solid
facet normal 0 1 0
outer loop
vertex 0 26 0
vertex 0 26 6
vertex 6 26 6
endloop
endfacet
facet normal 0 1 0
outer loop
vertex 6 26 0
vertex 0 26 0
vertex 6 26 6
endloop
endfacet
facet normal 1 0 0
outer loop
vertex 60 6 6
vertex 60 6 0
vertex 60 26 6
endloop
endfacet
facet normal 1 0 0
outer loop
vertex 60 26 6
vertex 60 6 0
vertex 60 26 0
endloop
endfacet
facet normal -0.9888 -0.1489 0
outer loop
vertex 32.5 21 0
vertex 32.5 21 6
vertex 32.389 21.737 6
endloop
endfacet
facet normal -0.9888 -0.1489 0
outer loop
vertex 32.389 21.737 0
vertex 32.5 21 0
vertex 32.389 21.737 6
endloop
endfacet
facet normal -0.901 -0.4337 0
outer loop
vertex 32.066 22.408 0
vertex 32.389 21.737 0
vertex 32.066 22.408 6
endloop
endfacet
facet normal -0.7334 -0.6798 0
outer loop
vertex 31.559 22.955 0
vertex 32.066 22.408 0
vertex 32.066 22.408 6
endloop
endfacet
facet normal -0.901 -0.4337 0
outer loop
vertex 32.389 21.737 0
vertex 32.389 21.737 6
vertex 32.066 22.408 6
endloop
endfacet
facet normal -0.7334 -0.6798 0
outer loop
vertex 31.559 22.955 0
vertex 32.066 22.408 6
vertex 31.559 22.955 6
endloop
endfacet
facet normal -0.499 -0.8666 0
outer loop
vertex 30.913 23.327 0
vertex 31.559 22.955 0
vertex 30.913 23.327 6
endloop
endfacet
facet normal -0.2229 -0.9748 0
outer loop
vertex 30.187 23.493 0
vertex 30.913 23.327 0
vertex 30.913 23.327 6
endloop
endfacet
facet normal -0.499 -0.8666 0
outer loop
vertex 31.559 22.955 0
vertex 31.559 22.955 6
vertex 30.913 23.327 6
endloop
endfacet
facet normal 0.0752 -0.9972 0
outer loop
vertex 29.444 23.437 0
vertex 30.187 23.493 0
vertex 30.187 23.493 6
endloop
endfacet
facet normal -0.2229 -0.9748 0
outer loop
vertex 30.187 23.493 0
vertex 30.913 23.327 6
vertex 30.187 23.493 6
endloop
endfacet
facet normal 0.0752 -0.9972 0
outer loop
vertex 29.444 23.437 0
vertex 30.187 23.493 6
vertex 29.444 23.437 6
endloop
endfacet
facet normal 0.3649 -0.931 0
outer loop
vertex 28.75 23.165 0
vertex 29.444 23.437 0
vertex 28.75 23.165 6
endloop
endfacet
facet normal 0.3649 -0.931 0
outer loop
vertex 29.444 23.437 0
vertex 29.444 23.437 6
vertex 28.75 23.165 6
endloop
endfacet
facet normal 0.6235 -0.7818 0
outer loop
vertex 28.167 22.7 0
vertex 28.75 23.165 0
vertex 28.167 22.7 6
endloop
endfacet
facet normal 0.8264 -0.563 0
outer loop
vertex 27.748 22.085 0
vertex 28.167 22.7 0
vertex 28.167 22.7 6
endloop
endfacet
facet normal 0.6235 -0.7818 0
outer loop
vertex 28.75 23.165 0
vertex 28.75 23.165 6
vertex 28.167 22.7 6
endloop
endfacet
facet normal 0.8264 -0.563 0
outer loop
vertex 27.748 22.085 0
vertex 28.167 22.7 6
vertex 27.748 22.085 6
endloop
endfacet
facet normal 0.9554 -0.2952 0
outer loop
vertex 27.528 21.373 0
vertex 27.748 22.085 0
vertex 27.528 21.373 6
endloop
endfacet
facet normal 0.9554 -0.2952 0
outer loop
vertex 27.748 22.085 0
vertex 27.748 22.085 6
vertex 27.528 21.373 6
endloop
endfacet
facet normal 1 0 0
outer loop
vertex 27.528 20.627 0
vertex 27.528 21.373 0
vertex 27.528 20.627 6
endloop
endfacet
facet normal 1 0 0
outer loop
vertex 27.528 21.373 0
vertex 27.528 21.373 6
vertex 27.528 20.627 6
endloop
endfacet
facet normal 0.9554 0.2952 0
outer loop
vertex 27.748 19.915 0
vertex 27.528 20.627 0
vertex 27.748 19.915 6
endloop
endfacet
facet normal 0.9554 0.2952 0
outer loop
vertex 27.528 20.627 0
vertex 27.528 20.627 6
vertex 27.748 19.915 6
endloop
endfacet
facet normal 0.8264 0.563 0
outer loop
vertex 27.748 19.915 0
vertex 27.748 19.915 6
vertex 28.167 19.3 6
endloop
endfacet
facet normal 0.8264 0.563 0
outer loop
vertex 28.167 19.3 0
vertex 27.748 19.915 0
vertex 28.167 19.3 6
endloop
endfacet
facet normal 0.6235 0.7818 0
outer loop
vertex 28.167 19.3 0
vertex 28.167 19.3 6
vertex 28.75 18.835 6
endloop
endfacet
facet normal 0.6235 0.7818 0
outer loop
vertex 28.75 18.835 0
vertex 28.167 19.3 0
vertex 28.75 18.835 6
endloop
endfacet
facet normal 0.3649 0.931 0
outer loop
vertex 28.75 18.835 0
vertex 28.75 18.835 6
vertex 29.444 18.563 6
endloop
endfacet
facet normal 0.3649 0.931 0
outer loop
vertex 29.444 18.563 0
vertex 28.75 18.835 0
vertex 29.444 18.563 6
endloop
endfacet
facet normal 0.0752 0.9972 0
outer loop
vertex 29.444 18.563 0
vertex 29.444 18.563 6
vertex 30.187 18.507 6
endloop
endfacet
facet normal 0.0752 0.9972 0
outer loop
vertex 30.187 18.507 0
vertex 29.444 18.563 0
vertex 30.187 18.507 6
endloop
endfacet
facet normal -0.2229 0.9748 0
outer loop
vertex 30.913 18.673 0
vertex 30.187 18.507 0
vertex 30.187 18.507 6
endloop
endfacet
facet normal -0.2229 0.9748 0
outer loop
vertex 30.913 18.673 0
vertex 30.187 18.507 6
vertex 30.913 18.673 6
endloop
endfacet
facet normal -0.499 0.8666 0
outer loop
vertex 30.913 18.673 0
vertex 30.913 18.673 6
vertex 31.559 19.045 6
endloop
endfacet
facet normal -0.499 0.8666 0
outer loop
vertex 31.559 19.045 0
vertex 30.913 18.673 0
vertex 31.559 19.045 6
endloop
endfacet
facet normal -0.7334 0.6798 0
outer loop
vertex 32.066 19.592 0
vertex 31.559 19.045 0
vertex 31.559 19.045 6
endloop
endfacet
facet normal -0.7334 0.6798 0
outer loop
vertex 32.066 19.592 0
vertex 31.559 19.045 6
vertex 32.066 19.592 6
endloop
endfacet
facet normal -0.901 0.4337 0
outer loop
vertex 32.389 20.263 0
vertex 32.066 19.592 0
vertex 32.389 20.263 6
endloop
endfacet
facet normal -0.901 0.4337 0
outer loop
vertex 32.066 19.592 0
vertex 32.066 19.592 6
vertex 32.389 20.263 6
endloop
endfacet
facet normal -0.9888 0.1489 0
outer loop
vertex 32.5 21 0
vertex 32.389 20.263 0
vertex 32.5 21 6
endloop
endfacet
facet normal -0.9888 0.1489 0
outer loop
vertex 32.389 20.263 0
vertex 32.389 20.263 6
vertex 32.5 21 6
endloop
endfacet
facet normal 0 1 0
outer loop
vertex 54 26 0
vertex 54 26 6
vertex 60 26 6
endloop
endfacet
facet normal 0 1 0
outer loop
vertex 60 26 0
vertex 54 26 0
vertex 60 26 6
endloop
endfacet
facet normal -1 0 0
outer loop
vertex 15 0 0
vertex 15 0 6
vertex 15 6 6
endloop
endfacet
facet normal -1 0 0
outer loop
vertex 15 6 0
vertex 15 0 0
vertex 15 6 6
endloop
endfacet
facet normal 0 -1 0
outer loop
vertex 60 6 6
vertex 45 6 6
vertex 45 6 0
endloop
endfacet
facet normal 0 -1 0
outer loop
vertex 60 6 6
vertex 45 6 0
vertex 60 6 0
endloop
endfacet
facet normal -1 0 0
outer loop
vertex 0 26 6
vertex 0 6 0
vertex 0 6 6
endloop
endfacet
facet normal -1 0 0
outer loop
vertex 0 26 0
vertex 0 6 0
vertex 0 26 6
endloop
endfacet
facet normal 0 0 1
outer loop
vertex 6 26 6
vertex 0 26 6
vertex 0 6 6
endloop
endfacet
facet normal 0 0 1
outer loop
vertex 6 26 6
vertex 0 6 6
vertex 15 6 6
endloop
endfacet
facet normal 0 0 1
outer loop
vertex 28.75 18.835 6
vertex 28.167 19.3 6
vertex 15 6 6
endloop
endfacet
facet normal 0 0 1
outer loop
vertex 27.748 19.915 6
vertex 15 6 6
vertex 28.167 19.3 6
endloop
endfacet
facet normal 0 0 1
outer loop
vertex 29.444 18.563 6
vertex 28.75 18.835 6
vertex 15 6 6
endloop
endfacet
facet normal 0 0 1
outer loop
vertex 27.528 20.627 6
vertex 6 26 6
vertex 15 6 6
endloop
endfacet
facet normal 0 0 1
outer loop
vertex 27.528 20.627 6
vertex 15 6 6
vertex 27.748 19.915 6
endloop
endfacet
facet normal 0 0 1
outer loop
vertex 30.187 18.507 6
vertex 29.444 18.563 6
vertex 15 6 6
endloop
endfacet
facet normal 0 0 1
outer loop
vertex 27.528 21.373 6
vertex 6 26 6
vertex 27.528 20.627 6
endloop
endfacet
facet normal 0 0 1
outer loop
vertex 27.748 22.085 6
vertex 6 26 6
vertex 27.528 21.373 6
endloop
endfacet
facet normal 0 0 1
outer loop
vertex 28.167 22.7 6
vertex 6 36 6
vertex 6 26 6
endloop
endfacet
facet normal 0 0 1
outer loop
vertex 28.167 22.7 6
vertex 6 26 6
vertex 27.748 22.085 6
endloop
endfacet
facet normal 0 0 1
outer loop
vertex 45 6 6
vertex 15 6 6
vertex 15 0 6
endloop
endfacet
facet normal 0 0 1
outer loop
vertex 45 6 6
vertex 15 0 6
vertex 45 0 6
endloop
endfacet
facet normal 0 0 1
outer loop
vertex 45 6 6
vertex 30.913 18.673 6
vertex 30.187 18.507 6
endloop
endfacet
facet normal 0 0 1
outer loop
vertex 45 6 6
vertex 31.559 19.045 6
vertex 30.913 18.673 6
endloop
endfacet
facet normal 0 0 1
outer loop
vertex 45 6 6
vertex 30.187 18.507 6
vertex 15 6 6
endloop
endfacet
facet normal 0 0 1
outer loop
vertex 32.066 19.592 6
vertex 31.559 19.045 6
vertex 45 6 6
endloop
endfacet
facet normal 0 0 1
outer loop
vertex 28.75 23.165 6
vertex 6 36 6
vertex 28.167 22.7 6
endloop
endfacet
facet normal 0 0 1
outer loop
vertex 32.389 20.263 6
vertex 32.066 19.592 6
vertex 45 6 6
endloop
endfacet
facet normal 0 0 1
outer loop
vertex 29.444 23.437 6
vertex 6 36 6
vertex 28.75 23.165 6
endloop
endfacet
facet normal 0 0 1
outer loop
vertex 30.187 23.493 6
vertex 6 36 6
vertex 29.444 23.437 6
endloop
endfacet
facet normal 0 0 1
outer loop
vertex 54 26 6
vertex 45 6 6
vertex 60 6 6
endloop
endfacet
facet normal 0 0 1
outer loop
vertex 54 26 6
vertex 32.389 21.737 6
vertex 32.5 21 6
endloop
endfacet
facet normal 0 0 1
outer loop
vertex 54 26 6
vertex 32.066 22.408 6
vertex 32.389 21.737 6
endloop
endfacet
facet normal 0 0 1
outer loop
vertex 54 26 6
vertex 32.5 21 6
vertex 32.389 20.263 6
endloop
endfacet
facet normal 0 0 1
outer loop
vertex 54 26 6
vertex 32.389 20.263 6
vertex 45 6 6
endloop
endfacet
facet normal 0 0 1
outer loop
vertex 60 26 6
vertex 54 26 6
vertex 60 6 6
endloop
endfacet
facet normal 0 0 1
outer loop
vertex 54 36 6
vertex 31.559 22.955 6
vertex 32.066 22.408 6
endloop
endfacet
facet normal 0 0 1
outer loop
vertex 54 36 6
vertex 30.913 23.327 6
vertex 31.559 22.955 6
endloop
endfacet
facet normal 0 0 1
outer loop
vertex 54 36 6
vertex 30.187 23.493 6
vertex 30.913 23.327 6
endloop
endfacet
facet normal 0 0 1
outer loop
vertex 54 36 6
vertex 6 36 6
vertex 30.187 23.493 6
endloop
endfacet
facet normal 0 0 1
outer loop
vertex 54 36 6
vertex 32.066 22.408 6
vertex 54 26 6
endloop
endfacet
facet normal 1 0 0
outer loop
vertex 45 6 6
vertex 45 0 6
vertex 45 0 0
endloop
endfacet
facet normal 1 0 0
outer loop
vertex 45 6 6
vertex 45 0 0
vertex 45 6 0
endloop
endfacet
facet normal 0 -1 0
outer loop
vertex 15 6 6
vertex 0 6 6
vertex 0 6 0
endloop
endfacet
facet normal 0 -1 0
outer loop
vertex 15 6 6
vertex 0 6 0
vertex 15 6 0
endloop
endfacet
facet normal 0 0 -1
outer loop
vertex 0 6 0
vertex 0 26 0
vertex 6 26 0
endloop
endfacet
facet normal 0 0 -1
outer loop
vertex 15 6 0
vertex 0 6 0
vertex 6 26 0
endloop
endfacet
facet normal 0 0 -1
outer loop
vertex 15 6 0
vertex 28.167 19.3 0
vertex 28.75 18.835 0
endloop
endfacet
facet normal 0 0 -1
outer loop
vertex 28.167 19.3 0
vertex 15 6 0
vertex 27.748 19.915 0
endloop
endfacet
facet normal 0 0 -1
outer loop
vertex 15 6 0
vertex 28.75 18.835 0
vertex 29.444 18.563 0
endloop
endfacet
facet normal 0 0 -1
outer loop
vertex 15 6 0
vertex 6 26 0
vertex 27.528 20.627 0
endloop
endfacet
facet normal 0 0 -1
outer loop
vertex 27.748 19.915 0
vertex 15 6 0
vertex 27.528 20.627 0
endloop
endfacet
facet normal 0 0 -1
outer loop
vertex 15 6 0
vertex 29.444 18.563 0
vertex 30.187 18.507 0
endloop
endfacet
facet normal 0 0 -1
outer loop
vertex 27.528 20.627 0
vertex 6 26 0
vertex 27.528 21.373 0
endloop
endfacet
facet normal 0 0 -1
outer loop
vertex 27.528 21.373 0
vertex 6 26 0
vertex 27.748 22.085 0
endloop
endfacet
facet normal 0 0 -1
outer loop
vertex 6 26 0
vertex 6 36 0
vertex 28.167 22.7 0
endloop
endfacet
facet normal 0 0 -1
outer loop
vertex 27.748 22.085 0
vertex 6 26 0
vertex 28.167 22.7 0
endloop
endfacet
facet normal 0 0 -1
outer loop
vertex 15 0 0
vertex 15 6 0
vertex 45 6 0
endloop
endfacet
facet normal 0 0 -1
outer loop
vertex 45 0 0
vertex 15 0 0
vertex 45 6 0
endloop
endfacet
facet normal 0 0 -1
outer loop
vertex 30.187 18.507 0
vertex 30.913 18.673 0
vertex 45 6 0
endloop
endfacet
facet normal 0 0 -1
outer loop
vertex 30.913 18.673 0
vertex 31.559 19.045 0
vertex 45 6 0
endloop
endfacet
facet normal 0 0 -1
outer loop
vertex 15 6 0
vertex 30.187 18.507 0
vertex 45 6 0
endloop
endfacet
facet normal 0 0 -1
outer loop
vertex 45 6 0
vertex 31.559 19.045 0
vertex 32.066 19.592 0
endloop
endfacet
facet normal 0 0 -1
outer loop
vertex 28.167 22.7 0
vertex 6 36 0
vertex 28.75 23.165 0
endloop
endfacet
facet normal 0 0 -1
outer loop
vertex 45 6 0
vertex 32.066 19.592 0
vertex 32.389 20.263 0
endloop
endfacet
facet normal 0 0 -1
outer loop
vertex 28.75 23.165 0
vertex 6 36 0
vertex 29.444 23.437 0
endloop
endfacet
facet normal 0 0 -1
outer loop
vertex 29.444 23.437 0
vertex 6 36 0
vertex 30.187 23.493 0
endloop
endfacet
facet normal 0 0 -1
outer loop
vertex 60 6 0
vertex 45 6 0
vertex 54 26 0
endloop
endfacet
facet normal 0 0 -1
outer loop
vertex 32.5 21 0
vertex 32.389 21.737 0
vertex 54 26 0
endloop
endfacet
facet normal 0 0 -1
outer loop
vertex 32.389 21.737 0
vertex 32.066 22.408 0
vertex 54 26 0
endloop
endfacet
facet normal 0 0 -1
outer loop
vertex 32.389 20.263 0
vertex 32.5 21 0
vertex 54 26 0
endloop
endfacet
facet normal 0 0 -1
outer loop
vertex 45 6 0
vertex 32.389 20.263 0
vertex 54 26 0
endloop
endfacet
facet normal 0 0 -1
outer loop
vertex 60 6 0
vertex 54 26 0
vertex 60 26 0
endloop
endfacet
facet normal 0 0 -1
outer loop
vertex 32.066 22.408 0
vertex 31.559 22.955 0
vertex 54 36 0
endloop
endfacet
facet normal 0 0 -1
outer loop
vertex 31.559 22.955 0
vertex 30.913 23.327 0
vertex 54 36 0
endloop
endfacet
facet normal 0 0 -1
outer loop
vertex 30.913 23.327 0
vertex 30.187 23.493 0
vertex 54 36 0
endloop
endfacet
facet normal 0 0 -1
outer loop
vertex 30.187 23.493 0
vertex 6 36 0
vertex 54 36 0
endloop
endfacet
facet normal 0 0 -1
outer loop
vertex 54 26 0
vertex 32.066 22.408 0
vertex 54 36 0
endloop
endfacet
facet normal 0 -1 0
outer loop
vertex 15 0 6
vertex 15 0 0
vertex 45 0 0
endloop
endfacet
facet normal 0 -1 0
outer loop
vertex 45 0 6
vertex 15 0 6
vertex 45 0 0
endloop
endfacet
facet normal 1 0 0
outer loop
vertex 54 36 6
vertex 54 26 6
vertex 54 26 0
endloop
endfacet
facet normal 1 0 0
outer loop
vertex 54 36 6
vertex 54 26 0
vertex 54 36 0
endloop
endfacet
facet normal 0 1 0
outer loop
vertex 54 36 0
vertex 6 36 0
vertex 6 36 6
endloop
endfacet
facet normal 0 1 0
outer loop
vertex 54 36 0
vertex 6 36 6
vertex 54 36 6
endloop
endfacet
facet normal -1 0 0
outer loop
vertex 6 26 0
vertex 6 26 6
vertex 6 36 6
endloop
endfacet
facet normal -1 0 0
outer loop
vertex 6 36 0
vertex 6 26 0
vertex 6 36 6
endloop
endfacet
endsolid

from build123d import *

# Parameters (mm, degrees)
SKETCH1_W           = 60
SKETCH1_H           = 36
BOSS_EXTRUDE1_DEPTH = 6
SKETCH2_W           = 15
SKETCH2_H           = 6
CUT_EXTRUDE1_DEPTH  = 6
SKETCH3_W           = 6
SKETCH3_H           = 10
CUT_EXTRUDE2_DEPTH  = 6
SKETCH4_R           = 2.5
CUT_EXTRUDE3_DEPTH  = 6


with BuildPart() as part:
    # Sketch1 → Boss-Extrude1 (new body)
    with BuildSketch(Plane.XY):
        with Locations((30, 18)):
            Rectangle(SKETCH1_W, SKETCH1_H)
    extrude(amount=BOSS_EXTRUDE1_DEPTH)

    # Sketch2 → Cut-Extrude1 (cut)
    with BuildSketch(Plane.XY.offset(6)):
        with Locations((7.5, 3)):
            Rectangle(SKETCH2_W, SKETCH2_H)
        with Locations((52.5, 3)):
            Rectangle(SKETCH2_W, SKETCH2_H)
    extrude(amount=-CUT_EXTRUDE1_DEPTH, mode=Mode.SUBTRACT)

    # Sketch3 → Cut-Extrude2 (cut)
    with BuildSketch(Plane.XY.offset(6)):
        with Locations((3, 31)):
            Rectangle(SKETCH3_W, SKETCH3_H)
        with Locations((57, 31)):
            Rectangle(SKETCH3_W, SKETCH3_H)
    extrude(amount=-CUT_EXTRUDE2_DEPTH, mode=Mode.SUBTRACT)

    # Sketch4 → Cut-Extrude3 (cut)
    with BuildSketch(Plane.XY.offset(6)):
        with Locations((30, 21)):
            Circle(SKETCH4_R)
    extrude(amount=-CUT_EXTRUDE3_DEPTH, mode=Mode.SUBTRACT)


solid = part.part
